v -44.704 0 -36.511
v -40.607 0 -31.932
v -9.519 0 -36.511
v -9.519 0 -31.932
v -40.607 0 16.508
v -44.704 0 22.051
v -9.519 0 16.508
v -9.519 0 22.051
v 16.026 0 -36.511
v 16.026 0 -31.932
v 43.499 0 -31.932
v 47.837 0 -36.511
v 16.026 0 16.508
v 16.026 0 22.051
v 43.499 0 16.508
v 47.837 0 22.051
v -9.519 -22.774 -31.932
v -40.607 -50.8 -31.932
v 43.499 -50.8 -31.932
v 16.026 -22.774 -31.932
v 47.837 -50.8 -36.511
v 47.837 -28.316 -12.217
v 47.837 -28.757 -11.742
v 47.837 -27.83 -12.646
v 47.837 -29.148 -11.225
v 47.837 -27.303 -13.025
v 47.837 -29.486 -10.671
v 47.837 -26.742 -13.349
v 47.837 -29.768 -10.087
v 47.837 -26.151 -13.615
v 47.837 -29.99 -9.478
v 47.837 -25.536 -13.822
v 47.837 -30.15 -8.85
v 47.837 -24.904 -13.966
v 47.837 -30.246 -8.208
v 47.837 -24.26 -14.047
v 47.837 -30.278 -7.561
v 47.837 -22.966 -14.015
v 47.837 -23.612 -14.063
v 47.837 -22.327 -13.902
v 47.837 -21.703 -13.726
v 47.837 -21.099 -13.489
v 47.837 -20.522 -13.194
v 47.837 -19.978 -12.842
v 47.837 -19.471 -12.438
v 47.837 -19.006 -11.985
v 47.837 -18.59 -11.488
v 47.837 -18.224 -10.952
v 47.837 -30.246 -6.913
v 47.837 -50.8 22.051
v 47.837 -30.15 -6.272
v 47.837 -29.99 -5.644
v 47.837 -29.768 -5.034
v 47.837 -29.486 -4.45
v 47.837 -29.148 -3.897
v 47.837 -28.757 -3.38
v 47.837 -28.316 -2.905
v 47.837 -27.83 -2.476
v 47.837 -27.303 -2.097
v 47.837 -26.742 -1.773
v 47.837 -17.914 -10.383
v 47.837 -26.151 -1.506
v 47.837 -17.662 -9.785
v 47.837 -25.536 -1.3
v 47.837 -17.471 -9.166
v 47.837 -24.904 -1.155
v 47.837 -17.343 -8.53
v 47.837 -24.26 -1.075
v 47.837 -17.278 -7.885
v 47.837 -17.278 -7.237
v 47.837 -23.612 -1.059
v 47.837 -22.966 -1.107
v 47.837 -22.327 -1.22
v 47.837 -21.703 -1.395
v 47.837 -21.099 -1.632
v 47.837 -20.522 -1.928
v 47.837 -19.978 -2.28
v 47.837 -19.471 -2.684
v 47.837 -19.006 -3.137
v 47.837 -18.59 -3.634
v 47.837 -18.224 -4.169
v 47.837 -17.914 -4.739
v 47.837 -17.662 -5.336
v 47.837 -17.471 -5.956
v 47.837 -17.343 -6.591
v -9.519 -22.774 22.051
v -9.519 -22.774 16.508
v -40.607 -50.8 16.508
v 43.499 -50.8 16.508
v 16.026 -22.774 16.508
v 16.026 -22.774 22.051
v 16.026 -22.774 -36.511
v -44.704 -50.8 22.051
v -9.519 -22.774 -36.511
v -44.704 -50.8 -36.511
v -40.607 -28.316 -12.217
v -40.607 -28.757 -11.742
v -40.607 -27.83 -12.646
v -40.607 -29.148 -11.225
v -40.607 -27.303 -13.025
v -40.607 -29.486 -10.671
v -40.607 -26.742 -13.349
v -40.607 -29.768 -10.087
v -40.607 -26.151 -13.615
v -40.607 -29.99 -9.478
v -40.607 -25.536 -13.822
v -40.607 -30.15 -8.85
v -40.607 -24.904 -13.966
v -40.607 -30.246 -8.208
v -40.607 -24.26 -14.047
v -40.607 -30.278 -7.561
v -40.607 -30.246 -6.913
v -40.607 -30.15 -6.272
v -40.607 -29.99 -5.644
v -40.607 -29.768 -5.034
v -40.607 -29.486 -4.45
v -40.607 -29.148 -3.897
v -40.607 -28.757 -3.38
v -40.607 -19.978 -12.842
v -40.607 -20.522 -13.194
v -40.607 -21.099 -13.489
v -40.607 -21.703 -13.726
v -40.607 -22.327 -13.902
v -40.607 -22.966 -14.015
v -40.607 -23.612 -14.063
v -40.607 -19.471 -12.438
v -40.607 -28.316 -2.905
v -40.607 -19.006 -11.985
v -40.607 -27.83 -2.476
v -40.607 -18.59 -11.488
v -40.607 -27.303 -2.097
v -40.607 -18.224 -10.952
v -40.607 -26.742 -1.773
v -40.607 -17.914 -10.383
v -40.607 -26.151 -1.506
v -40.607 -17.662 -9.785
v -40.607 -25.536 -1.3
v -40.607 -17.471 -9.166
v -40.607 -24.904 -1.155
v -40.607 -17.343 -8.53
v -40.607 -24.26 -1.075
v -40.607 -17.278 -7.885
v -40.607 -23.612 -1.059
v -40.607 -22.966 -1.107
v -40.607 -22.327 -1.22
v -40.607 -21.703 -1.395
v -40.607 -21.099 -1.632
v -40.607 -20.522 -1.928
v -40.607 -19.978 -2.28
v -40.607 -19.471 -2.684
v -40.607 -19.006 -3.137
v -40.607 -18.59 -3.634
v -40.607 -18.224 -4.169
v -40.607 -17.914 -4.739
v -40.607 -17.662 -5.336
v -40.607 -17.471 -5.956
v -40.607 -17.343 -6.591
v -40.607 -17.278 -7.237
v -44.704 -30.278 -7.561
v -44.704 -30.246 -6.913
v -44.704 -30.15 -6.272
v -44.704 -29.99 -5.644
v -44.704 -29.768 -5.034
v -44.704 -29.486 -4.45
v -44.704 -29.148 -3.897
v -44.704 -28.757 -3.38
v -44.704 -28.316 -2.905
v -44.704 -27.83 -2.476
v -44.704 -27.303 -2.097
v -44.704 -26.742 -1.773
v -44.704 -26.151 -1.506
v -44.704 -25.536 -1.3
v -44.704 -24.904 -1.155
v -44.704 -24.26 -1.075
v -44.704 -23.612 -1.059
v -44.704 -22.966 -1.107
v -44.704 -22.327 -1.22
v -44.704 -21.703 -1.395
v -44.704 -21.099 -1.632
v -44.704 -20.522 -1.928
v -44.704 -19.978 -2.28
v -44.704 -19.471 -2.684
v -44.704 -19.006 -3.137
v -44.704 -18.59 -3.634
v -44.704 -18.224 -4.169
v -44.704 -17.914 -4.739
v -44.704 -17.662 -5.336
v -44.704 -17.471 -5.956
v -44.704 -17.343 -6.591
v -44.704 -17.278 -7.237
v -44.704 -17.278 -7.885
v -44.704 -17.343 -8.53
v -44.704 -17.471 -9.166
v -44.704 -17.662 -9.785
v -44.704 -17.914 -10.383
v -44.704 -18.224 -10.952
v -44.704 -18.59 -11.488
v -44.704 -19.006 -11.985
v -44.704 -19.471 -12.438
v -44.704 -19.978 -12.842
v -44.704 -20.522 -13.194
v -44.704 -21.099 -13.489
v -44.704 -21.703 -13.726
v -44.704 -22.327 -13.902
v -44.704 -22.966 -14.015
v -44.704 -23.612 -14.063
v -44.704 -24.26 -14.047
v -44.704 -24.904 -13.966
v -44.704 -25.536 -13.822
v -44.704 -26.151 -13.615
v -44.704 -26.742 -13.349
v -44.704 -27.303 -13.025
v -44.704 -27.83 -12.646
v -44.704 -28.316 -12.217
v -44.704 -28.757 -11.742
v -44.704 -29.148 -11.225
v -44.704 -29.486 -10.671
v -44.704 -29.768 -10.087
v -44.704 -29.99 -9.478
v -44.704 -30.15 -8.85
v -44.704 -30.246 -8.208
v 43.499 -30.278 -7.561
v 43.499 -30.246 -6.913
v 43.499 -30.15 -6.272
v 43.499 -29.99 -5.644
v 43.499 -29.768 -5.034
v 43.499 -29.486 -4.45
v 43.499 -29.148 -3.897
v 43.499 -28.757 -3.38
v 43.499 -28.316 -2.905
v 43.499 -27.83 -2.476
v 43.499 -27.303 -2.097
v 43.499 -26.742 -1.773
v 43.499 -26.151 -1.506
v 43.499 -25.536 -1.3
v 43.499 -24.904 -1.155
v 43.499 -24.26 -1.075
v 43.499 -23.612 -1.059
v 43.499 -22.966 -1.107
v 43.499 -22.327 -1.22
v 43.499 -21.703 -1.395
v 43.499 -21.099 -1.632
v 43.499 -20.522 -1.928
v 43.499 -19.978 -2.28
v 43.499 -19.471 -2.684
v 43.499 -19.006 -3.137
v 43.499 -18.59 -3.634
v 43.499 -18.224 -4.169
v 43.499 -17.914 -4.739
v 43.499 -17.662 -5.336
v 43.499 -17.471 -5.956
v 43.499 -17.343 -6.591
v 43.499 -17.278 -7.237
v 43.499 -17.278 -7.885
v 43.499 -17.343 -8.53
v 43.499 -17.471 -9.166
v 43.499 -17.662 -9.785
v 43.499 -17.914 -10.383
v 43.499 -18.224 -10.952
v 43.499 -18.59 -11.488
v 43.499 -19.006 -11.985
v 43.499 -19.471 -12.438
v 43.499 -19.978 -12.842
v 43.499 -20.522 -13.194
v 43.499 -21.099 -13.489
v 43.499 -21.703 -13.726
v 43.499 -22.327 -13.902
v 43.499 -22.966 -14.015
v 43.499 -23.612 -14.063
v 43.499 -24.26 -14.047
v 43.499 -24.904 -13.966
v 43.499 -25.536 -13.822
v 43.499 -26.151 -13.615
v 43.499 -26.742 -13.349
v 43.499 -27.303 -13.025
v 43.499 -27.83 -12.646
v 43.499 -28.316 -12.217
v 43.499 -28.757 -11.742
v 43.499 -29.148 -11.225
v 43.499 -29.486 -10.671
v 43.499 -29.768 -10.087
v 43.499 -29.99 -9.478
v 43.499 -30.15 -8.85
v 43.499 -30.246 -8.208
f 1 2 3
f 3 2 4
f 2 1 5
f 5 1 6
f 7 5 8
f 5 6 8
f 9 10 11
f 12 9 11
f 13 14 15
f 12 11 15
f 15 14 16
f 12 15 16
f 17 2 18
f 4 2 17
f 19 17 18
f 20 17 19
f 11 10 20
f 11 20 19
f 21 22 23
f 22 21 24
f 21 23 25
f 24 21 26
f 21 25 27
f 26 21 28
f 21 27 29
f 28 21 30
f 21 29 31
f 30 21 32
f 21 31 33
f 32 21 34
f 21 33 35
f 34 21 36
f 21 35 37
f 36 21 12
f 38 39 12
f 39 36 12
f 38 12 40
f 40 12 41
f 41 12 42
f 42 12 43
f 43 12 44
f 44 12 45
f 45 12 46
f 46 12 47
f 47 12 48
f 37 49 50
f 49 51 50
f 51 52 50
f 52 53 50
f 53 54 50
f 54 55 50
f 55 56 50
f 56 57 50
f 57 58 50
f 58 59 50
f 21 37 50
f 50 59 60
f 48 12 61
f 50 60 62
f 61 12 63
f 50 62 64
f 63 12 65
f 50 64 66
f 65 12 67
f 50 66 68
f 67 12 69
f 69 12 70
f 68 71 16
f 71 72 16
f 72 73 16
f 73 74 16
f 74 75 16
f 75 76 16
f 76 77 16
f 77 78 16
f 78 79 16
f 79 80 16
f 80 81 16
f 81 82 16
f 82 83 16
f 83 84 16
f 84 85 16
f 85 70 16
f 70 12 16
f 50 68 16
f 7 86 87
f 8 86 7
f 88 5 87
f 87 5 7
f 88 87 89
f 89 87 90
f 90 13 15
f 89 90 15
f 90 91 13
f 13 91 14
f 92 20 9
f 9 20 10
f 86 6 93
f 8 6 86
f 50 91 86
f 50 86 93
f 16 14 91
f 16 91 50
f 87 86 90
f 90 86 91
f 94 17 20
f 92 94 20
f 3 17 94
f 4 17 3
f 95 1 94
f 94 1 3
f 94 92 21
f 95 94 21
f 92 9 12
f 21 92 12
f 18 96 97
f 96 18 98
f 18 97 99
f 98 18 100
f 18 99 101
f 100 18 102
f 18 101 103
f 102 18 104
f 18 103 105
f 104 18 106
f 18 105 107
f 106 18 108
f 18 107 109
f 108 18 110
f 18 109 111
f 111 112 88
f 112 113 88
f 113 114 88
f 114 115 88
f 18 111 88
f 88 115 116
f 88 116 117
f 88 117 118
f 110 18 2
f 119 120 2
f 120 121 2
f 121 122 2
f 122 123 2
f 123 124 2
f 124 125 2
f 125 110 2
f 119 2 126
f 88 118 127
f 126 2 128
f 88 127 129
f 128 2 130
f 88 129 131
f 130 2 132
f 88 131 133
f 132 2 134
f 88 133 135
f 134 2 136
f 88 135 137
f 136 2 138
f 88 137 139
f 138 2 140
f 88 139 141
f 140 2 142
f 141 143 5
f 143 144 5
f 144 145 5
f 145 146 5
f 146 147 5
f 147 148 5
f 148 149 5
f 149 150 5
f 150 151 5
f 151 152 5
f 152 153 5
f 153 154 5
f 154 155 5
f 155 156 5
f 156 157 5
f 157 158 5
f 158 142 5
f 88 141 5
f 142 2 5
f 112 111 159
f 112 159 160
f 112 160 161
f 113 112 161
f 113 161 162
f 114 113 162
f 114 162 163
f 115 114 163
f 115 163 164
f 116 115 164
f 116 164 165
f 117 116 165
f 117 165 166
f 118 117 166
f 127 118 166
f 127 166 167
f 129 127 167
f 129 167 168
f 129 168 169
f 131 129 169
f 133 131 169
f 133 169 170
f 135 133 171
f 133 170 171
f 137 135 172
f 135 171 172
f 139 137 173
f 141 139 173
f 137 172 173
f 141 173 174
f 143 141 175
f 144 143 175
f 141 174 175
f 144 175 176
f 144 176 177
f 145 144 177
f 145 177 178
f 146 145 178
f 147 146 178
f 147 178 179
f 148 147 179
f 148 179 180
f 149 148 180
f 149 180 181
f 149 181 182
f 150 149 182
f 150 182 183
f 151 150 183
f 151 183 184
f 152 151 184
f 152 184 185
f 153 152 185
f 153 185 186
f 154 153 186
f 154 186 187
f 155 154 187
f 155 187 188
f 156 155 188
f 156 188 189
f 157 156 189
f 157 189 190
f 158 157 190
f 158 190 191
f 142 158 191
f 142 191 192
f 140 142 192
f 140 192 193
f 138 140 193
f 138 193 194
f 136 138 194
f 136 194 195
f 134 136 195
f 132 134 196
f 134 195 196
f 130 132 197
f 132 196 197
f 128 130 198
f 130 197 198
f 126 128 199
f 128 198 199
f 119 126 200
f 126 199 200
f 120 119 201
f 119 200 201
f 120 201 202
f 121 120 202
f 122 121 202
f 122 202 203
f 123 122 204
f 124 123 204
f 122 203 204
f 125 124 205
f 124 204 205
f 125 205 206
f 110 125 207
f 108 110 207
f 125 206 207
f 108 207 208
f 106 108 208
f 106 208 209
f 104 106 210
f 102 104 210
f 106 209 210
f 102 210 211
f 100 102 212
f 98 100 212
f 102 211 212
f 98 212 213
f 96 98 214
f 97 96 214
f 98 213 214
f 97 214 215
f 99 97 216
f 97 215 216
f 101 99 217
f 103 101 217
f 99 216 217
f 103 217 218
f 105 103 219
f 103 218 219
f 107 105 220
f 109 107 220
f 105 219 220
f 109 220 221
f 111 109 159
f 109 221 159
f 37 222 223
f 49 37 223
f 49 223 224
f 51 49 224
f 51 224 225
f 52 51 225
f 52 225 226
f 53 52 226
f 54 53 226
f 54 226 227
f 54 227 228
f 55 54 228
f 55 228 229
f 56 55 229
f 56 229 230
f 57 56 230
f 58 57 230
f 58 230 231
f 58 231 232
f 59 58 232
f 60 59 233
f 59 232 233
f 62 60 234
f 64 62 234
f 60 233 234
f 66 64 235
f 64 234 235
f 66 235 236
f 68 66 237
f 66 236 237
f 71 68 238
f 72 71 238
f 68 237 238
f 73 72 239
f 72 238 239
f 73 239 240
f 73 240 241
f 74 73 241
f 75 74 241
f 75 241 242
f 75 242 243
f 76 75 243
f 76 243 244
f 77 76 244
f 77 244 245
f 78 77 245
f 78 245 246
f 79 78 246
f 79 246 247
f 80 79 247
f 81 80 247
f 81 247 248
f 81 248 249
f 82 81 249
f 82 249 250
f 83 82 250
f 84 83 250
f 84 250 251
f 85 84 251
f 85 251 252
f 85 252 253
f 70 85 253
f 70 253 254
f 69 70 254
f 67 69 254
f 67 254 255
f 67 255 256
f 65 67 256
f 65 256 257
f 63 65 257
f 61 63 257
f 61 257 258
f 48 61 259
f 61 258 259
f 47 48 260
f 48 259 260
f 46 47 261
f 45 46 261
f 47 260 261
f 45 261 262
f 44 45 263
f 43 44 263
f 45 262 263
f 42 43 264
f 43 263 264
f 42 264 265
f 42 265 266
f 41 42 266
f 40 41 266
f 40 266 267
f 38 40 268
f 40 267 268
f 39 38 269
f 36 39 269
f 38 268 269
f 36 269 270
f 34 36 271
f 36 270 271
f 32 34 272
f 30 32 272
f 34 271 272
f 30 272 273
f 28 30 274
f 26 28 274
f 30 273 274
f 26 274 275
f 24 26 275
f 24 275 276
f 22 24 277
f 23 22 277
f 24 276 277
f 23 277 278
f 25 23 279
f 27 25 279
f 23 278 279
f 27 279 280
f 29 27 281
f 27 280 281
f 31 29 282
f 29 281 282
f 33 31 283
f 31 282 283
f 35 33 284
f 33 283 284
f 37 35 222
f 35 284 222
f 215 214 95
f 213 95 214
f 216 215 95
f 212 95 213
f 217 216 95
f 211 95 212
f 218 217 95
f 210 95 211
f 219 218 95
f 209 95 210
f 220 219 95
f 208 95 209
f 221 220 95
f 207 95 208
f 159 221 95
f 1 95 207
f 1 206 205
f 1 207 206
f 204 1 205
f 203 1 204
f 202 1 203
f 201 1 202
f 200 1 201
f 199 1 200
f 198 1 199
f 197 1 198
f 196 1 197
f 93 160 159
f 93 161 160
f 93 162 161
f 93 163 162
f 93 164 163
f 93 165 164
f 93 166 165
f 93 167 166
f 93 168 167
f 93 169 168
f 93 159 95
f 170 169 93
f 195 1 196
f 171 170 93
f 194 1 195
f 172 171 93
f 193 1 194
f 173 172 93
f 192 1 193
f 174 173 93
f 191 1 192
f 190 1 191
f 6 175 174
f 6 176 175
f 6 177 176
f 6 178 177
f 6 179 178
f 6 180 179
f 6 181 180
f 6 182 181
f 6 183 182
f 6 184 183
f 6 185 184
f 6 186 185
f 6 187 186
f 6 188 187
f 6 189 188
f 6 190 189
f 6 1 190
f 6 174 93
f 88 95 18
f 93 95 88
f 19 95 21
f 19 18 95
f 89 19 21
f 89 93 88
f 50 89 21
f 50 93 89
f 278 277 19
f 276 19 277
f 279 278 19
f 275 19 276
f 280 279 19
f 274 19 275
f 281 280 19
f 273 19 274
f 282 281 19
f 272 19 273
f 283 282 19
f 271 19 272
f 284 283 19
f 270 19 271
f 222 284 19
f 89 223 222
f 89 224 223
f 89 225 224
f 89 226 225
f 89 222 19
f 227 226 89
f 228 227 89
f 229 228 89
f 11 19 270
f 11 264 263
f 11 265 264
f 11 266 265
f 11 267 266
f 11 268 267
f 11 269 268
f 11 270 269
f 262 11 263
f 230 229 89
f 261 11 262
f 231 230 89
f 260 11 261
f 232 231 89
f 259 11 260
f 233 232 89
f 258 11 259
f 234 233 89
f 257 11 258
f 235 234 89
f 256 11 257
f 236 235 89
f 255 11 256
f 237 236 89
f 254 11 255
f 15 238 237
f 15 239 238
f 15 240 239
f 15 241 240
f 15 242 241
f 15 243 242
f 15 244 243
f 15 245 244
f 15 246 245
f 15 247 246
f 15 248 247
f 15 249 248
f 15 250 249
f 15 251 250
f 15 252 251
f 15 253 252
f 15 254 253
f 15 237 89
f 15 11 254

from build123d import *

# Parameters (mm, degrees)
F0_W     = 92.541683
F0_H     = 58.561536
F1_DEPTH = 50.8
F2_W     = 84.106896
F2_H     = 48.43979
F3_DEPTH = 51.308
F4_W     = 25.545361
F4_H     = 22.773931
F5_DEPTH = 58.928
F6_R     = 6.504184
F7_DEPTH = 110.236


with BuildPart() as f1:
    # F0 (on Front) → F1 (new body)
    with BuildSketch(Plane.XZ):
        with Locations((1.566461, -7.229819)):
            Rectangle(F0_W, F0_H)
    extrude(amount=F1_DEPTH)

    # F2 (on Front) → F3 (cut)
    with BuildSketch(Plane.XZ):
        with Locations((1.445962, -7.711807)):
            Rectangle(F2_W, F2_H)
    extrude(amount=F3_DEPTH, mode=Mode.SUBTRACT)

    # F4 (on face) → F5 (cut)
    with BuildSketch(Plane.XY.offset(22.050949)):
        with Locations((3.253419, -11.386965)):
            Rectangle(F4_W, F4_H)
    extrude(amount=-F5_DEPTH, mode=Mode.SUBTRACT)

    # F6 (on face) → F7 (cut)
    with BuildSketch(Plane(origin=(-44.704381, 0, 0), x_dir=(0, -1, 0), z_dir=(-1, 0, 0))):
        with Locations((23.774298, -7.560832)):
            Circle(F6_R)
    extrude(amount=-F7_DEPTH, mode=Mode.SUBTRACT)


solid = f1.part
